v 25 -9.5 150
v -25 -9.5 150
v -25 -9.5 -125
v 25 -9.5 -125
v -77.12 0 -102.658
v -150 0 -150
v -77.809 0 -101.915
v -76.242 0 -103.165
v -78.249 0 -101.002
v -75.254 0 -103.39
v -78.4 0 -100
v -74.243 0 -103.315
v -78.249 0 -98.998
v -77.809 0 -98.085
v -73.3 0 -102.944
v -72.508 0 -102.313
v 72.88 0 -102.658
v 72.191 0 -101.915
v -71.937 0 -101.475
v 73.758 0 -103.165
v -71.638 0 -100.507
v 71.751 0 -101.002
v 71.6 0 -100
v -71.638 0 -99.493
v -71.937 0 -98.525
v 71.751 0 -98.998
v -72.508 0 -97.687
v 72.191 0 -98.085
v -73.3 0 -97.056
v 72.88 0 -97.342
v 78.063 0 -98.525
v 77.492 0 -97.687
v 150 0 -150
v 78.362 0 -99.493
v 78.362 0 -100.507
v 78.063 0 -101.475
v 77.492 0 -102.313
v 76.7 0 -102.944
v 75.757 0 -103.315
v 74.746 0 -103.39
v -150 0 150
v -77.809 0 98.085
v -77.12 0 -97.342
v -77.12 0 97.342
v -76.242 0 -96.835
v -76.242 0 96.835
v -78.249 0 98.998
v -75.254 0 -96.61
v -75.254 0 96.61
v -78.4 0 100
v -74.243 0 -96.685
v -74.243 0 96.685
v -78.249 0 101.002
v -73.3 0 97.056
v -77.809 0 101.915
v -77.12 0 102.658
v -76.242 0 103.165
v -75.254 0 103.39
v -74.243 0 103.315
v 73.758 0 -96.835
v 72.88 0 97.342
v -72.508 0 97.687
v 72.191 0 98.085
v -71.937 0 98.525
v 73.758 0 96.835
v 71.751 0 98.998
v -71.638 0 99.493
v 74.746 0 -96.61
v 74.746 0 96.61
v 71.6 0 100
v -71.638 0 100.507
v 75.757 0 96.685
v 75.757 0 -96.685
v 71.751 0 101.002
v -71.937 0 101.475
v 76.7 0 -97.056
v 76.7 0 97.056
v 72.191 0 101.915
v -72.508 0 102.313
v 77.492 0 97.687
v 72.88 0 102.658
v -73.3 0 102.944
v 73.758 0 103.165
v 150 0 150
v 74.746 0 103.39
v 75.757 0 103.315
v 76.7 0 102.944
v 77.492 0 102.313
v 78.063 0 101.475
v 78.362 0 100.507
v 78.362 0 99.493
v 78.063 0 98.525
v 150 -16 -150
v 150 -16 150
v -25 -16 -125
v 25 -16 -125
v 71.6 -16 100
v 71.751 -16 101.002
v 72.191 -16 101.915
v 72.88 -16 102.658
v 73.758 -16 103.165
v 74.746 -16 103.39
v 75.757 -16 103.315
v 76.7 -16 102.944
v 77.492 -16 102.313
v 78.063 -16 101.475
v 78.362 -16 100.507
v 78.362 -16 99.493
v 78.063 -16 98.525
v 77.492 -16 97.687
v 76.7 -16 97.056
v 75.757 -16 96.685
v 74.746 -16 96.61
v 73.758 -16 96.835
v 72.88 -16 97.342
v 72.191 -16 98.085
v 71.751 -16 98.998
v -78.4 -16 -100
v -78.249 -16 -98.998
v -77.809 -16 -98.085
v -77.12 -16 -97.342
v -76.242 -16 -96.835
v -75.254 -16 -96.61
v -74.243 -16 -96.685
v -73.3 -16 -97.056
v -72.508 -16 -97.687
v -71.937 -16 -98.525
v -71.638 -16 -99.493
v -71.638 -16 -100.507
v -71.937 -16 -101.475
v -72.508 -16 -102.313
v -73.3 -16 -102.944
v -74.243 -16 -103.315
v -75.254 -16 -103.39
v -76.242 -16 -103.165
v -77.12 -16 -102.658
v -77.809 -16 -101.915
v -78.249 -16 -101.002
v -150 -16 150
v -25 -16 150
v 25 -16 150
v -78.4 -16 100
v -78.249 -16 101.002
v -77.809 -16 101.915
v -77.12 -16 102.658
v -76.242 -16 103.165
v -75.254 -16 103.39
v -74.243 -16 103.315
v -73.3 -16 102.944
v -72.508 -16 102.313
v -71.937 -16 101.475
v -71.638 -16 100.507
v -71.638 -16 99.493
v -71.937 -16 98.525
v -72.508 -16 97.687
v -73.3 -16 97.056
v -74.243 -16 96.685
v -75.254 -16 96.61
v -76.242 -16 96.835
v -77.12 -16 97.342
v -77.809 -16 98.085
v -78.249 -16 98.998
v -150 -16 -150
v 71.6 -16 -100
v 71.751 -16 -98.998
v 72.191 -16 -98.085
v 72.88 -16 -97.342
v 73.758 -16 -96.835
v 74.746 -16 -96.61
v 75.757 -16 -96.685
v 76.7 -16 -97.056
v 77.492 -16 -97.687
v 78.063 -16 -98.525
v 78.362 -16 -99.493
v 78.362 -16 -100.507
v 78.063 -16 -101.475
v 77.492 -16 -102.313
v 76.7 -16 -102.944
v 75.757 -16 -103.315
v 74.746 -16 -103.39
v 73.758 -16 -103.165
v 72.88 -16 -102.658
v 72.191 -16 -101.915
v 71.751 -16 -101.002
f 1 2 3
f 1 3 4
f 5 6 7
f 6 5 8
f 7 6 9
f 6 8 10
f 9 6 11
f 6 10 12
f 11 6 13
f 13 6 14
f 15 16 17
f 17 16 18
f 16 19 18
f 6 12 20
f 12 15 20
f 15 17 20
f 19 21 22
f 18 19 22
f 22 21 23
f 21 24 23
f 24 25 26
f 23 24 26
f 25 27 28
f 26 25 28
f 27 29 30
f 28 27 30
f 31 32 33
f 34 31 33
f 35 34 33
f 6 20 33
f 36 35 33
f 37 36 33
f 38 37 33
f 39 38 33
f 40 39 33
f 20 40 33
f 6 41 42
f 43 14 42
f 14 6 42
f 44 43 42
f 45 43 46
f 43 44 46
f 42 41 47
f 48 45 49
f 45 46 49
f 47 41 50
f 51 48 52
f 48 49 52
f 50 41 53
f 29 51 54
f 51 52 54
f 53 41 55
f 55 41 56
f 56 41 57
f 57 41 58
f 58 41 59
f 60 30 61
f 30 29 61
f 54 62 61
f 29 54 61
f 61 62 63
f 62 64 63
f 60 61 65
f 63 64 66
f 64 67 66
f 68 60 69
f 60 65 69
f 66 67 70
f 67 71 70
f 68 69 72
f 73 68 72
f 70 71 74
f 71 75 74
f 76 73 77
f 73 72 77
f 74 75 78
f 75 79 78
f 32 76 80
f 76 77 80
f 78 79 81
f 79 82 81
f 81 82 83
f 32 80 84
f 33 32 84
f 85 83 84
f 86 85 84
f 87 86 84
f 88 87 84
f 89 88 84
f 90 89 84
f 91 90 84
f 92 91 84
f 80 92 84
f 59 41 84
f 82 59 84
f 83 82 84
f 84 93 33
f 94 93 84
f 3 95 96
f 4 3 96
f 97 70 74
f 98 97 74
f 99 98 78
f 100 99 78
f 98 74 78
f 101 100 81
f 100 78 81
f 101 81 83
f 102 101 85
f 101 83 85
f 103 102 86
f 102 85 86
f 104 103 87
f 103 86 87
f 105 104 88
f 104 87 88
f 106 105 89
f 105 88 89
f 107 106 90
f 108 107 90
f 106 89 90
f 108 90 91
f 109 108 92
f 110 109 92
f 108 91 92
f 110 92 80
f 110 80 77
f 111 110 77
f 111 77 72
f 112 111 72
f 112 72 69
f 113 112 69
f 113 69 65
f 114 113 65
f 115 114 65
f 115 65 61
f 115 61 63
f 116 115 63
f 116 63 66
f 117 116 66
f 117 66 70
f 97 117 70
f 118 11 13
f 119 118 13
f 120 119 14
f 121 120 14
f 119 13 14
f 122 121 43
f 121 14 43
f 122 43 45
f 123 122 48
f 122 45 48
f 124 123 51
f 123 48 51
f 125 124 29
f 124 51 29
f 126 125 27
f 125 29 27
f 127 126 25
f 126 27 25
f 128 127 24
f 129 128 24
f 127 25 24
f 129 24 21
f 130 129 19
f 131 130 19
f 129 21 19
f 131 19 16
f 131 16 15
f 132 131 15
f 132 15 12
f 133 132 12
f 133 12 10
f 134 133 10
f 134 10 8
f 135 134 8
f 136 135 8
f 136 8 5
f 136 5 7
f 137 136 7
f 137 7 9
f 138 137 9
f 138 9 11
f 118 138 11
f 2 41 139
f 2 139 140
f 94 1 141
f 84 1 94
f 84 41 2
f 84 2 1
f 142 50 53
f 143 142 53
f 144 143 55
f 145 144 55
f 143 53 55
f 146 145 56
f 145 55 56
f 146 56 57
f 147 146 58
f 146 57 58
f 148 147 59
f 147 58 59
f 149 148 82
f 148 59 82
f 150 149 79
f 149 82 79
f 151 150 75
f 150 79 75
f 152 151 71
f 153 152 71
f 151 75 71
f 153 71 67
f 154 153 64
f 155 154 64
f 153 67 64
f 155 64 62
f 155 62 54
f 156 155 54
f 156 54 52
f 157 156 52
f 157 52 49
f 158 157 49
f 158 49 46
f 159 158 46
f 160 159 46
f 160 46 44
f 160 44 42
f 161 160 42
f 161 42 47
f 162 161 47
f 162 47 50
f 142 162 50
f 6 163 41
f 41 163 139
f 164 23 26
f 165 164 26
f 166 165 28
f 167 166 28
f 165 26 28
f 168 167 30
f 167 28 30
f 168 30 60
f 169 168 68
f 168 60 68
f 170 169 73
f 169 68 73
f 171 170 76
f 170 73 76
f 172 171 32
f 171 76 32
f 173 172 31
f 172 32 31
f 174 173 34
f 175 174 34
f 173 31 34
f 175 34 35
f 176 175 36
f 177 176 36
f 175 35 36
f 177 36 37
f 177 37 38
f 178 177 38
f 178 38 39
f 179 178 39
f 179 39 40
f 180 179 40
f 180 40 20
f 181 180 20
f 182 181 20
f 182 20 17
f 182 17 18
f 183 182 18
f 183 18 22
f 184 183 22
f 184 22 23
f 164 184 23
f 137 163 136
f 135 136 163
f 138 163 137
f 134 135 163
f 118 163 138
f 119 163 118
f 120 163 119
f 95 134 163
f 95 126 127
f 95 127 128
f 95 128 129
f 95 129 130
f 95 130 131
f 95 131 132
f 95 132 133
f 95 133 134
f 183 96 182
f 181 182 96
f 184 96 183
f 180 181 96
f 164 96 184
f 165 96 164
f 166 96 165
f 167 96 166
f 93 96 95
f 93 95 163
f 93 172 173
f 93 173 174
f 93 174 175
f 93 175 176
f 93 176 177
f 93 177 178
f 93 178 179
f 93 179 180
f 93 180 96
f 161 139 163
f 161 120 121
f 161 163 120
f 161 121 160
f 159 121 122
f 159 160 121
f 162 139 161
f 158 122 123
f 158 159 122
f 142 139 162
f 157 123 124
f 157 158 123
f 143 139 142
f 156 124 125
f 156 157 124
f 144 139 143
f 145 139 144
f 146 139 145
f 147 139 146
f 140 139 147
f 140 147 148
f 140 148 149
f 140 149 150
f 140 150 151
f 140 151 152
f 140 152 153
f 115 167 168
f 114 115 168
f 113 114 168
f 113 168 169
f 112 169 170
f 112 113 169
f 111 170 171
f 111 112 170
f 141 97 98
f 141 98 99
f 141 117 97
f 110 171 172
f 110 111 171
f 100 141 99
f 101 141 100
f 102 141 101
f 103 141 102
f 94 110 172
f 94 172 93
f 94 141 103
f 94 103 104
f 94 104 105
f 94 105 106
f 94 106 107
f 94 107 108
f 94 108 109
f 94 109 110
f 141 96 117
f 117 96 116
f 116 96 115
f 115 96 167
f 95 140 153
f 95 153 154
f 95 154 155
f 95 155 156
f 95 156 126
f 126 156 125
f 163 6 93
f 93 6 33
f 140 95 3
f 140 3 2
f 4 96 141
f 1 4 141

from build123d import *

# Parameters (mm, degrees)
F0_W     = 310
F0_H     = 300
F1_DEPTH = 16
F2_W     = 5
F2_H     = 300
F3_DEPTH = 16.001
F4_W     = 50
F4_H     = 275
F5_DEPTH = 6.5
F7_D     = 6.8
F7_DEPTH = 20
F7_TIP   = 2.0429261047


with BuildPart() as f1:
    # F0 (on Front) → F1 (new body)
    with BuildSketch(Plane.XZ):
        Rectangle(F0_W, F0_H)
    extrude(amount=F1_DEPTH)

    # F2 (on face) → F3 (cut, through all)
    with BuildSketch(Plane.XZ.offset(16)):
        with Locations((152.5, 0)):
            Rectangle(F2_W, F2_H)
        with Locations((-152.5, 0)):
            Rectangle(F2_W, F2_H)
    extrude(amount=-F3_DEPTH, mode=Mode.SUBTRACT)

    # F4 (on face) → F5 (cut)
    with BuildSketch(Plane.XZ.offset(16)):
        with Locations((0, 12.5)):
            Rectangle(F4_W, F4_H)
    extrude(amount=-F5_DEPTH, mode=Mode.SUBTRACT)

    # F7
    with Locations(Plane.XZ.offset(16)):
        with Locations((-75, 100), (75, 100), (75, -100), (-75, -100)):
            Hole(F7_D / 2, depth=F7_DEPTH)
            with Locations((0, 0, -(F7_DEPTH + F7_TIP / 2))):  # 118° drill point
                Cone(0, F7_D / 2, F7_TIP, mode=Mode.SUBTRACT)


solid = f1.part
